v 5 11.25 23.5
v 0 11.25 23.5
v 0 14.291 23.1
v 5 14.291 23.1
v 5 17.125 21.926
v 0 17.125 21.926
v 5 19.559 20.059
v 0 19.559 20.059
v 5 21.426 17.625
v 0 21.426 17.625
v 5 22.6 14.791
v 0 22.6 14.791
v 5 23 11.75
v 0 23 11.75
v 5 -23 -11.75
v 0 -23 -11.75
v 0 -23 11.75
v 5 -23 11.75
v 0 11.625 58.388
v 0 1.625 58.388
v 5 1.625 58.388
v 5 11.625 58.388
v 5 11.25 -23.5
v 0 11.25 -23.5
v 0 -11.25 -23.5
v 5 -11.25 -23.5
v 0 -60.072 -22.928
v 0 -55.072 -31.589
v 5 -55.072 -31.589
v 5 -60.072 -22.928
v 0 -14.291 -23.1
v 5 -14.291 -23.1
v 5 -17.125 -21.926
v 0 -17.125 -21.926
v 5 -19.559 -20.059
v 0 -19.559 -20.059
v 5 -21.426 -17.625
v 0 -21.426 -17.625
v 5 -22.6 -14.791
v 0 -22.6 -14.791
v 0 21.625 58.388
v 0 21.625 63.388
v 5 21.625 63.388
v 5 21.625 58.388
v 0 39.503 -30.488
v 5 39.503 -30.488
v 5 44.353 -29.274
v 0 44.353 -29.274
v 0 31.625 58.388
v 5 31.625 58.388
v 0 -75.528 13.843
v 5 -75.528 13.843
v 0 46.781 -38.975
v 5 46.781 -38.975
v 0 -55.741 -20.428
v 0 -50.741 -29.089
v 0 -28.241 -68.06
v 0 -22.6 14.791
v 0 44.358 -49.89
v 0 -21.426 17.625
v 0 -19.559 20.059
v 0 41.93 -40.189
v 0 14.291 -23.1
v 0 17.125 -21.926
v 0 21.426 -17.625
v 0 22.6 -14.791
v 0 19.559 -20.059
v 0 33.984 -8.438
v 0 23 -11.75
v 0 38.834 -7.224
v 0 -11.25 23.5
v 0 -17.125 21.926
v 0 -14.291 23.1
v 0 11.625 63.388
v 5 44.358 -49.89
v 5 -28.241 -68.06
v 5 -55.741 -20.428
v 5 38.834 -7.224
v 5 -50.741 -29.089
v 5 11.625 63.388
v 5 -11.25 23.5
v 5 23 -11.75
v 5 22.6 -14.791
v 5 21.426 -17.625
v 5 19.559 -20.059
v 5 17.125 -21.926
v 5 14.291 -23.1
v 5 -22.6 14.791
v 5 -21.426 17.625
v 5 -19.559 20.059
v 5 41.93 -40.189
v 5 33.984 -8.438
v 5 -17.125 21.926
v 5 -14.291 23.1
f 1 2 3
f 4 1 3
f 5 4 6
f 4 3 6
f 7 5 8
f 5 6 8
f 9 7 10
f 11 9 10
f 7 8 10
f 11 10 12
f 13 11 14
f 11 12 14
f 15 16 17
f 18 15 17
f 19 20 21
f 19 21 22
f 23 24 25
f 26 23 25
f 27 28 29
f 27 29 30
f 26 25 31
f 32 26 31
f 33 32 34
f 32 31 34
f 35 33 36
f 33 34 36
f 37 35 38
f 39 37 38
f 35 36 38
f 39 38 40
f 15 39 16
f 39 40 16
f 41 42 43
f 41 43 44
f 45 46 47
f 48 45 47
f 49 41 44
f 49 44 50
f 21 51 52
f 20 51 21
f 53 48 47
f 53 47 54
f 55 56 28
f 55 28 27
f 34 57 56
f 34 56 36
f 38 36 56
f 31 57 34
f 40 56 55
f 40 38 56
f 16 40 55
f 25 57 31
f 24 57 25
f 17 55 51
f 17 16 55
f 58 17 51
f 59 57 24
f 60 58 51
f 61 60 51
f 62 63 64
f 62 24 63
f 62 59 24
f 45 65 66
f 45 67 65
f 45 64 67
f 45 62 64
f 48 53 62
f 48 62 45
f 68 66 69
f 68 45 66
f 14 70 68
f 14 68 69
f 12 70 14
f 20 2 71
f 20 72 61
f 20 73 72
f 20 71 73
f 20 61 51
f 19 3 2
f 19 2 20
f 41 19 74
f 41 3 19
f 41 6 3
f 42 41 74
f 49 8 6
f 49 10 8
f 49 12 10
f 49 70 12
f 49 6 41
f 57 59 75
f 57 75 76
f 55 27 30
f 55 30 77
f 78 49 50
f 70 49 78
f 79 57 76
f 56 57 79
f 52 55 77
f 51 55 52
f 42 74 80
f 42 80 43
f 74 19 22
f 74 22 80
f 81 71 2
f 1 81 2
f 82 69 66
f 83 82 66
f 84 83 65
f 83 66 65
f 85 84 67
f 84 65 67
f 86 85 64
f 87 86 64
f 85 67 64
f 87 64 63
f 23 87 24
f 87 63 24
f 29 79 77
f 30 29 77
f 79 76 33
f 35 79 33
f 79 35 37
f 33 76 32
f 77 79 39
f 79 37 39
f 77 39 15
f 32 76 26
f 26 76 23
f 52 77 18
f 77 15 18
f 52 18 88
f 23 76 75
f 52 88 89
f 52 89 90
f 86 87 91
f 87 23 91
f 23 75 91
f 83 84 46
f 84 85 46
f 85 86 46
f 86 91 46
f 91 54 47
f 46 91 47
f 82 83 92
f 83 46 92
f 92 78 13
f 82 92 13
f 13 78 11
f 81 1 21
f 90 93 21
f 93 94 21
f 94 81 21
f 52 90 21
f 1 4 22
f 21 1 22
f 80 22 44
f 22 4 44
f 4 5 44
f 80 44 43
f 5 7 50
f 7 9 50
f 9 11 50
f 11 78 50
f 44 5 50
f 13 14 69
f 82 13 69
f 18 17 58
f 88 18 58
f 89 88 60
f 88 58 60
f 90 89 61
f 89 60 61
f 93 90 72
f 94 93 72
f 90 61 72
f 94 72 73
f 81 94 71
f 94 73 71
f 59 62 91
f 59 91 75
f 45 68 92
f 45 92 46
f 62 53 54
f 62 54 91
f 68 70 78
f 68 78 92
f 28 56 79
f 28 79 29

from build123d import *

# Parameters (mm, degrees)
BOSS_EXTRU_1_DEPTH = 5


with BuildPart() as part:
    # Esquisse1 → Boss.-Extru.1 (new body)
    with BuildSketch(Plane(origin=(0, 0, 0), x_dir=(0, 0, -1), z_dir=(1, 0, 0))):
        Polygon((20.428249593, -55.741422484), (-13.843425106, -75.528183097), (-58.387612711, 1.624613017), (-58.387612711, 11.624613017), (-63.387612711, 11.624613017), (-63.387612711, 21.624613017), (-58.387612711, 21.624613017), (-58.387612711, 31.624613017), (7.224475537, 38.834467888), (8.438400995, 33.984067391), (30.488285558, 39.502563492), (29.2743601, 44.352963989), (38.975161094, 46.780814906), (40.189086552, 41.930414409), (49.889887546, 44.358265326), (68.059646801, -28.241422484), (29.08850363, -50.741422484), (31.58850363, -55.071549503), (22.928249593, -60.071549503), align=None)
        with BuildLine():
            Line((-11.75, 23), (11.75, 23))
            ThreePointArc((11.75, 23), (20.058504679, 19.558504679), (23.5, 11.25))
            Line((23.5, 11.25), (23.5, -11.25))
            ThreePointArc((23.5, -11.25), (20.058504679, -19.558504679), (11.75, -23))
            Line((11.75, -23), (-11.75, -23))
            ThreePointArc((-11.75, -23), (-20.058504679, -19.558504679), (-23.5, -11.25))
            Line((-23.5, -11.25), (-23.5, 11.25))
            ThreePointArc((-23.5, 11.25), (-20.058504679, 19.558504679), (-11.75, 23))
        make_face(mode=Mode.SUBTRACT)
    extrude(amount=BOSS_EXTRU_1_DEPTH)


solid = part.part
